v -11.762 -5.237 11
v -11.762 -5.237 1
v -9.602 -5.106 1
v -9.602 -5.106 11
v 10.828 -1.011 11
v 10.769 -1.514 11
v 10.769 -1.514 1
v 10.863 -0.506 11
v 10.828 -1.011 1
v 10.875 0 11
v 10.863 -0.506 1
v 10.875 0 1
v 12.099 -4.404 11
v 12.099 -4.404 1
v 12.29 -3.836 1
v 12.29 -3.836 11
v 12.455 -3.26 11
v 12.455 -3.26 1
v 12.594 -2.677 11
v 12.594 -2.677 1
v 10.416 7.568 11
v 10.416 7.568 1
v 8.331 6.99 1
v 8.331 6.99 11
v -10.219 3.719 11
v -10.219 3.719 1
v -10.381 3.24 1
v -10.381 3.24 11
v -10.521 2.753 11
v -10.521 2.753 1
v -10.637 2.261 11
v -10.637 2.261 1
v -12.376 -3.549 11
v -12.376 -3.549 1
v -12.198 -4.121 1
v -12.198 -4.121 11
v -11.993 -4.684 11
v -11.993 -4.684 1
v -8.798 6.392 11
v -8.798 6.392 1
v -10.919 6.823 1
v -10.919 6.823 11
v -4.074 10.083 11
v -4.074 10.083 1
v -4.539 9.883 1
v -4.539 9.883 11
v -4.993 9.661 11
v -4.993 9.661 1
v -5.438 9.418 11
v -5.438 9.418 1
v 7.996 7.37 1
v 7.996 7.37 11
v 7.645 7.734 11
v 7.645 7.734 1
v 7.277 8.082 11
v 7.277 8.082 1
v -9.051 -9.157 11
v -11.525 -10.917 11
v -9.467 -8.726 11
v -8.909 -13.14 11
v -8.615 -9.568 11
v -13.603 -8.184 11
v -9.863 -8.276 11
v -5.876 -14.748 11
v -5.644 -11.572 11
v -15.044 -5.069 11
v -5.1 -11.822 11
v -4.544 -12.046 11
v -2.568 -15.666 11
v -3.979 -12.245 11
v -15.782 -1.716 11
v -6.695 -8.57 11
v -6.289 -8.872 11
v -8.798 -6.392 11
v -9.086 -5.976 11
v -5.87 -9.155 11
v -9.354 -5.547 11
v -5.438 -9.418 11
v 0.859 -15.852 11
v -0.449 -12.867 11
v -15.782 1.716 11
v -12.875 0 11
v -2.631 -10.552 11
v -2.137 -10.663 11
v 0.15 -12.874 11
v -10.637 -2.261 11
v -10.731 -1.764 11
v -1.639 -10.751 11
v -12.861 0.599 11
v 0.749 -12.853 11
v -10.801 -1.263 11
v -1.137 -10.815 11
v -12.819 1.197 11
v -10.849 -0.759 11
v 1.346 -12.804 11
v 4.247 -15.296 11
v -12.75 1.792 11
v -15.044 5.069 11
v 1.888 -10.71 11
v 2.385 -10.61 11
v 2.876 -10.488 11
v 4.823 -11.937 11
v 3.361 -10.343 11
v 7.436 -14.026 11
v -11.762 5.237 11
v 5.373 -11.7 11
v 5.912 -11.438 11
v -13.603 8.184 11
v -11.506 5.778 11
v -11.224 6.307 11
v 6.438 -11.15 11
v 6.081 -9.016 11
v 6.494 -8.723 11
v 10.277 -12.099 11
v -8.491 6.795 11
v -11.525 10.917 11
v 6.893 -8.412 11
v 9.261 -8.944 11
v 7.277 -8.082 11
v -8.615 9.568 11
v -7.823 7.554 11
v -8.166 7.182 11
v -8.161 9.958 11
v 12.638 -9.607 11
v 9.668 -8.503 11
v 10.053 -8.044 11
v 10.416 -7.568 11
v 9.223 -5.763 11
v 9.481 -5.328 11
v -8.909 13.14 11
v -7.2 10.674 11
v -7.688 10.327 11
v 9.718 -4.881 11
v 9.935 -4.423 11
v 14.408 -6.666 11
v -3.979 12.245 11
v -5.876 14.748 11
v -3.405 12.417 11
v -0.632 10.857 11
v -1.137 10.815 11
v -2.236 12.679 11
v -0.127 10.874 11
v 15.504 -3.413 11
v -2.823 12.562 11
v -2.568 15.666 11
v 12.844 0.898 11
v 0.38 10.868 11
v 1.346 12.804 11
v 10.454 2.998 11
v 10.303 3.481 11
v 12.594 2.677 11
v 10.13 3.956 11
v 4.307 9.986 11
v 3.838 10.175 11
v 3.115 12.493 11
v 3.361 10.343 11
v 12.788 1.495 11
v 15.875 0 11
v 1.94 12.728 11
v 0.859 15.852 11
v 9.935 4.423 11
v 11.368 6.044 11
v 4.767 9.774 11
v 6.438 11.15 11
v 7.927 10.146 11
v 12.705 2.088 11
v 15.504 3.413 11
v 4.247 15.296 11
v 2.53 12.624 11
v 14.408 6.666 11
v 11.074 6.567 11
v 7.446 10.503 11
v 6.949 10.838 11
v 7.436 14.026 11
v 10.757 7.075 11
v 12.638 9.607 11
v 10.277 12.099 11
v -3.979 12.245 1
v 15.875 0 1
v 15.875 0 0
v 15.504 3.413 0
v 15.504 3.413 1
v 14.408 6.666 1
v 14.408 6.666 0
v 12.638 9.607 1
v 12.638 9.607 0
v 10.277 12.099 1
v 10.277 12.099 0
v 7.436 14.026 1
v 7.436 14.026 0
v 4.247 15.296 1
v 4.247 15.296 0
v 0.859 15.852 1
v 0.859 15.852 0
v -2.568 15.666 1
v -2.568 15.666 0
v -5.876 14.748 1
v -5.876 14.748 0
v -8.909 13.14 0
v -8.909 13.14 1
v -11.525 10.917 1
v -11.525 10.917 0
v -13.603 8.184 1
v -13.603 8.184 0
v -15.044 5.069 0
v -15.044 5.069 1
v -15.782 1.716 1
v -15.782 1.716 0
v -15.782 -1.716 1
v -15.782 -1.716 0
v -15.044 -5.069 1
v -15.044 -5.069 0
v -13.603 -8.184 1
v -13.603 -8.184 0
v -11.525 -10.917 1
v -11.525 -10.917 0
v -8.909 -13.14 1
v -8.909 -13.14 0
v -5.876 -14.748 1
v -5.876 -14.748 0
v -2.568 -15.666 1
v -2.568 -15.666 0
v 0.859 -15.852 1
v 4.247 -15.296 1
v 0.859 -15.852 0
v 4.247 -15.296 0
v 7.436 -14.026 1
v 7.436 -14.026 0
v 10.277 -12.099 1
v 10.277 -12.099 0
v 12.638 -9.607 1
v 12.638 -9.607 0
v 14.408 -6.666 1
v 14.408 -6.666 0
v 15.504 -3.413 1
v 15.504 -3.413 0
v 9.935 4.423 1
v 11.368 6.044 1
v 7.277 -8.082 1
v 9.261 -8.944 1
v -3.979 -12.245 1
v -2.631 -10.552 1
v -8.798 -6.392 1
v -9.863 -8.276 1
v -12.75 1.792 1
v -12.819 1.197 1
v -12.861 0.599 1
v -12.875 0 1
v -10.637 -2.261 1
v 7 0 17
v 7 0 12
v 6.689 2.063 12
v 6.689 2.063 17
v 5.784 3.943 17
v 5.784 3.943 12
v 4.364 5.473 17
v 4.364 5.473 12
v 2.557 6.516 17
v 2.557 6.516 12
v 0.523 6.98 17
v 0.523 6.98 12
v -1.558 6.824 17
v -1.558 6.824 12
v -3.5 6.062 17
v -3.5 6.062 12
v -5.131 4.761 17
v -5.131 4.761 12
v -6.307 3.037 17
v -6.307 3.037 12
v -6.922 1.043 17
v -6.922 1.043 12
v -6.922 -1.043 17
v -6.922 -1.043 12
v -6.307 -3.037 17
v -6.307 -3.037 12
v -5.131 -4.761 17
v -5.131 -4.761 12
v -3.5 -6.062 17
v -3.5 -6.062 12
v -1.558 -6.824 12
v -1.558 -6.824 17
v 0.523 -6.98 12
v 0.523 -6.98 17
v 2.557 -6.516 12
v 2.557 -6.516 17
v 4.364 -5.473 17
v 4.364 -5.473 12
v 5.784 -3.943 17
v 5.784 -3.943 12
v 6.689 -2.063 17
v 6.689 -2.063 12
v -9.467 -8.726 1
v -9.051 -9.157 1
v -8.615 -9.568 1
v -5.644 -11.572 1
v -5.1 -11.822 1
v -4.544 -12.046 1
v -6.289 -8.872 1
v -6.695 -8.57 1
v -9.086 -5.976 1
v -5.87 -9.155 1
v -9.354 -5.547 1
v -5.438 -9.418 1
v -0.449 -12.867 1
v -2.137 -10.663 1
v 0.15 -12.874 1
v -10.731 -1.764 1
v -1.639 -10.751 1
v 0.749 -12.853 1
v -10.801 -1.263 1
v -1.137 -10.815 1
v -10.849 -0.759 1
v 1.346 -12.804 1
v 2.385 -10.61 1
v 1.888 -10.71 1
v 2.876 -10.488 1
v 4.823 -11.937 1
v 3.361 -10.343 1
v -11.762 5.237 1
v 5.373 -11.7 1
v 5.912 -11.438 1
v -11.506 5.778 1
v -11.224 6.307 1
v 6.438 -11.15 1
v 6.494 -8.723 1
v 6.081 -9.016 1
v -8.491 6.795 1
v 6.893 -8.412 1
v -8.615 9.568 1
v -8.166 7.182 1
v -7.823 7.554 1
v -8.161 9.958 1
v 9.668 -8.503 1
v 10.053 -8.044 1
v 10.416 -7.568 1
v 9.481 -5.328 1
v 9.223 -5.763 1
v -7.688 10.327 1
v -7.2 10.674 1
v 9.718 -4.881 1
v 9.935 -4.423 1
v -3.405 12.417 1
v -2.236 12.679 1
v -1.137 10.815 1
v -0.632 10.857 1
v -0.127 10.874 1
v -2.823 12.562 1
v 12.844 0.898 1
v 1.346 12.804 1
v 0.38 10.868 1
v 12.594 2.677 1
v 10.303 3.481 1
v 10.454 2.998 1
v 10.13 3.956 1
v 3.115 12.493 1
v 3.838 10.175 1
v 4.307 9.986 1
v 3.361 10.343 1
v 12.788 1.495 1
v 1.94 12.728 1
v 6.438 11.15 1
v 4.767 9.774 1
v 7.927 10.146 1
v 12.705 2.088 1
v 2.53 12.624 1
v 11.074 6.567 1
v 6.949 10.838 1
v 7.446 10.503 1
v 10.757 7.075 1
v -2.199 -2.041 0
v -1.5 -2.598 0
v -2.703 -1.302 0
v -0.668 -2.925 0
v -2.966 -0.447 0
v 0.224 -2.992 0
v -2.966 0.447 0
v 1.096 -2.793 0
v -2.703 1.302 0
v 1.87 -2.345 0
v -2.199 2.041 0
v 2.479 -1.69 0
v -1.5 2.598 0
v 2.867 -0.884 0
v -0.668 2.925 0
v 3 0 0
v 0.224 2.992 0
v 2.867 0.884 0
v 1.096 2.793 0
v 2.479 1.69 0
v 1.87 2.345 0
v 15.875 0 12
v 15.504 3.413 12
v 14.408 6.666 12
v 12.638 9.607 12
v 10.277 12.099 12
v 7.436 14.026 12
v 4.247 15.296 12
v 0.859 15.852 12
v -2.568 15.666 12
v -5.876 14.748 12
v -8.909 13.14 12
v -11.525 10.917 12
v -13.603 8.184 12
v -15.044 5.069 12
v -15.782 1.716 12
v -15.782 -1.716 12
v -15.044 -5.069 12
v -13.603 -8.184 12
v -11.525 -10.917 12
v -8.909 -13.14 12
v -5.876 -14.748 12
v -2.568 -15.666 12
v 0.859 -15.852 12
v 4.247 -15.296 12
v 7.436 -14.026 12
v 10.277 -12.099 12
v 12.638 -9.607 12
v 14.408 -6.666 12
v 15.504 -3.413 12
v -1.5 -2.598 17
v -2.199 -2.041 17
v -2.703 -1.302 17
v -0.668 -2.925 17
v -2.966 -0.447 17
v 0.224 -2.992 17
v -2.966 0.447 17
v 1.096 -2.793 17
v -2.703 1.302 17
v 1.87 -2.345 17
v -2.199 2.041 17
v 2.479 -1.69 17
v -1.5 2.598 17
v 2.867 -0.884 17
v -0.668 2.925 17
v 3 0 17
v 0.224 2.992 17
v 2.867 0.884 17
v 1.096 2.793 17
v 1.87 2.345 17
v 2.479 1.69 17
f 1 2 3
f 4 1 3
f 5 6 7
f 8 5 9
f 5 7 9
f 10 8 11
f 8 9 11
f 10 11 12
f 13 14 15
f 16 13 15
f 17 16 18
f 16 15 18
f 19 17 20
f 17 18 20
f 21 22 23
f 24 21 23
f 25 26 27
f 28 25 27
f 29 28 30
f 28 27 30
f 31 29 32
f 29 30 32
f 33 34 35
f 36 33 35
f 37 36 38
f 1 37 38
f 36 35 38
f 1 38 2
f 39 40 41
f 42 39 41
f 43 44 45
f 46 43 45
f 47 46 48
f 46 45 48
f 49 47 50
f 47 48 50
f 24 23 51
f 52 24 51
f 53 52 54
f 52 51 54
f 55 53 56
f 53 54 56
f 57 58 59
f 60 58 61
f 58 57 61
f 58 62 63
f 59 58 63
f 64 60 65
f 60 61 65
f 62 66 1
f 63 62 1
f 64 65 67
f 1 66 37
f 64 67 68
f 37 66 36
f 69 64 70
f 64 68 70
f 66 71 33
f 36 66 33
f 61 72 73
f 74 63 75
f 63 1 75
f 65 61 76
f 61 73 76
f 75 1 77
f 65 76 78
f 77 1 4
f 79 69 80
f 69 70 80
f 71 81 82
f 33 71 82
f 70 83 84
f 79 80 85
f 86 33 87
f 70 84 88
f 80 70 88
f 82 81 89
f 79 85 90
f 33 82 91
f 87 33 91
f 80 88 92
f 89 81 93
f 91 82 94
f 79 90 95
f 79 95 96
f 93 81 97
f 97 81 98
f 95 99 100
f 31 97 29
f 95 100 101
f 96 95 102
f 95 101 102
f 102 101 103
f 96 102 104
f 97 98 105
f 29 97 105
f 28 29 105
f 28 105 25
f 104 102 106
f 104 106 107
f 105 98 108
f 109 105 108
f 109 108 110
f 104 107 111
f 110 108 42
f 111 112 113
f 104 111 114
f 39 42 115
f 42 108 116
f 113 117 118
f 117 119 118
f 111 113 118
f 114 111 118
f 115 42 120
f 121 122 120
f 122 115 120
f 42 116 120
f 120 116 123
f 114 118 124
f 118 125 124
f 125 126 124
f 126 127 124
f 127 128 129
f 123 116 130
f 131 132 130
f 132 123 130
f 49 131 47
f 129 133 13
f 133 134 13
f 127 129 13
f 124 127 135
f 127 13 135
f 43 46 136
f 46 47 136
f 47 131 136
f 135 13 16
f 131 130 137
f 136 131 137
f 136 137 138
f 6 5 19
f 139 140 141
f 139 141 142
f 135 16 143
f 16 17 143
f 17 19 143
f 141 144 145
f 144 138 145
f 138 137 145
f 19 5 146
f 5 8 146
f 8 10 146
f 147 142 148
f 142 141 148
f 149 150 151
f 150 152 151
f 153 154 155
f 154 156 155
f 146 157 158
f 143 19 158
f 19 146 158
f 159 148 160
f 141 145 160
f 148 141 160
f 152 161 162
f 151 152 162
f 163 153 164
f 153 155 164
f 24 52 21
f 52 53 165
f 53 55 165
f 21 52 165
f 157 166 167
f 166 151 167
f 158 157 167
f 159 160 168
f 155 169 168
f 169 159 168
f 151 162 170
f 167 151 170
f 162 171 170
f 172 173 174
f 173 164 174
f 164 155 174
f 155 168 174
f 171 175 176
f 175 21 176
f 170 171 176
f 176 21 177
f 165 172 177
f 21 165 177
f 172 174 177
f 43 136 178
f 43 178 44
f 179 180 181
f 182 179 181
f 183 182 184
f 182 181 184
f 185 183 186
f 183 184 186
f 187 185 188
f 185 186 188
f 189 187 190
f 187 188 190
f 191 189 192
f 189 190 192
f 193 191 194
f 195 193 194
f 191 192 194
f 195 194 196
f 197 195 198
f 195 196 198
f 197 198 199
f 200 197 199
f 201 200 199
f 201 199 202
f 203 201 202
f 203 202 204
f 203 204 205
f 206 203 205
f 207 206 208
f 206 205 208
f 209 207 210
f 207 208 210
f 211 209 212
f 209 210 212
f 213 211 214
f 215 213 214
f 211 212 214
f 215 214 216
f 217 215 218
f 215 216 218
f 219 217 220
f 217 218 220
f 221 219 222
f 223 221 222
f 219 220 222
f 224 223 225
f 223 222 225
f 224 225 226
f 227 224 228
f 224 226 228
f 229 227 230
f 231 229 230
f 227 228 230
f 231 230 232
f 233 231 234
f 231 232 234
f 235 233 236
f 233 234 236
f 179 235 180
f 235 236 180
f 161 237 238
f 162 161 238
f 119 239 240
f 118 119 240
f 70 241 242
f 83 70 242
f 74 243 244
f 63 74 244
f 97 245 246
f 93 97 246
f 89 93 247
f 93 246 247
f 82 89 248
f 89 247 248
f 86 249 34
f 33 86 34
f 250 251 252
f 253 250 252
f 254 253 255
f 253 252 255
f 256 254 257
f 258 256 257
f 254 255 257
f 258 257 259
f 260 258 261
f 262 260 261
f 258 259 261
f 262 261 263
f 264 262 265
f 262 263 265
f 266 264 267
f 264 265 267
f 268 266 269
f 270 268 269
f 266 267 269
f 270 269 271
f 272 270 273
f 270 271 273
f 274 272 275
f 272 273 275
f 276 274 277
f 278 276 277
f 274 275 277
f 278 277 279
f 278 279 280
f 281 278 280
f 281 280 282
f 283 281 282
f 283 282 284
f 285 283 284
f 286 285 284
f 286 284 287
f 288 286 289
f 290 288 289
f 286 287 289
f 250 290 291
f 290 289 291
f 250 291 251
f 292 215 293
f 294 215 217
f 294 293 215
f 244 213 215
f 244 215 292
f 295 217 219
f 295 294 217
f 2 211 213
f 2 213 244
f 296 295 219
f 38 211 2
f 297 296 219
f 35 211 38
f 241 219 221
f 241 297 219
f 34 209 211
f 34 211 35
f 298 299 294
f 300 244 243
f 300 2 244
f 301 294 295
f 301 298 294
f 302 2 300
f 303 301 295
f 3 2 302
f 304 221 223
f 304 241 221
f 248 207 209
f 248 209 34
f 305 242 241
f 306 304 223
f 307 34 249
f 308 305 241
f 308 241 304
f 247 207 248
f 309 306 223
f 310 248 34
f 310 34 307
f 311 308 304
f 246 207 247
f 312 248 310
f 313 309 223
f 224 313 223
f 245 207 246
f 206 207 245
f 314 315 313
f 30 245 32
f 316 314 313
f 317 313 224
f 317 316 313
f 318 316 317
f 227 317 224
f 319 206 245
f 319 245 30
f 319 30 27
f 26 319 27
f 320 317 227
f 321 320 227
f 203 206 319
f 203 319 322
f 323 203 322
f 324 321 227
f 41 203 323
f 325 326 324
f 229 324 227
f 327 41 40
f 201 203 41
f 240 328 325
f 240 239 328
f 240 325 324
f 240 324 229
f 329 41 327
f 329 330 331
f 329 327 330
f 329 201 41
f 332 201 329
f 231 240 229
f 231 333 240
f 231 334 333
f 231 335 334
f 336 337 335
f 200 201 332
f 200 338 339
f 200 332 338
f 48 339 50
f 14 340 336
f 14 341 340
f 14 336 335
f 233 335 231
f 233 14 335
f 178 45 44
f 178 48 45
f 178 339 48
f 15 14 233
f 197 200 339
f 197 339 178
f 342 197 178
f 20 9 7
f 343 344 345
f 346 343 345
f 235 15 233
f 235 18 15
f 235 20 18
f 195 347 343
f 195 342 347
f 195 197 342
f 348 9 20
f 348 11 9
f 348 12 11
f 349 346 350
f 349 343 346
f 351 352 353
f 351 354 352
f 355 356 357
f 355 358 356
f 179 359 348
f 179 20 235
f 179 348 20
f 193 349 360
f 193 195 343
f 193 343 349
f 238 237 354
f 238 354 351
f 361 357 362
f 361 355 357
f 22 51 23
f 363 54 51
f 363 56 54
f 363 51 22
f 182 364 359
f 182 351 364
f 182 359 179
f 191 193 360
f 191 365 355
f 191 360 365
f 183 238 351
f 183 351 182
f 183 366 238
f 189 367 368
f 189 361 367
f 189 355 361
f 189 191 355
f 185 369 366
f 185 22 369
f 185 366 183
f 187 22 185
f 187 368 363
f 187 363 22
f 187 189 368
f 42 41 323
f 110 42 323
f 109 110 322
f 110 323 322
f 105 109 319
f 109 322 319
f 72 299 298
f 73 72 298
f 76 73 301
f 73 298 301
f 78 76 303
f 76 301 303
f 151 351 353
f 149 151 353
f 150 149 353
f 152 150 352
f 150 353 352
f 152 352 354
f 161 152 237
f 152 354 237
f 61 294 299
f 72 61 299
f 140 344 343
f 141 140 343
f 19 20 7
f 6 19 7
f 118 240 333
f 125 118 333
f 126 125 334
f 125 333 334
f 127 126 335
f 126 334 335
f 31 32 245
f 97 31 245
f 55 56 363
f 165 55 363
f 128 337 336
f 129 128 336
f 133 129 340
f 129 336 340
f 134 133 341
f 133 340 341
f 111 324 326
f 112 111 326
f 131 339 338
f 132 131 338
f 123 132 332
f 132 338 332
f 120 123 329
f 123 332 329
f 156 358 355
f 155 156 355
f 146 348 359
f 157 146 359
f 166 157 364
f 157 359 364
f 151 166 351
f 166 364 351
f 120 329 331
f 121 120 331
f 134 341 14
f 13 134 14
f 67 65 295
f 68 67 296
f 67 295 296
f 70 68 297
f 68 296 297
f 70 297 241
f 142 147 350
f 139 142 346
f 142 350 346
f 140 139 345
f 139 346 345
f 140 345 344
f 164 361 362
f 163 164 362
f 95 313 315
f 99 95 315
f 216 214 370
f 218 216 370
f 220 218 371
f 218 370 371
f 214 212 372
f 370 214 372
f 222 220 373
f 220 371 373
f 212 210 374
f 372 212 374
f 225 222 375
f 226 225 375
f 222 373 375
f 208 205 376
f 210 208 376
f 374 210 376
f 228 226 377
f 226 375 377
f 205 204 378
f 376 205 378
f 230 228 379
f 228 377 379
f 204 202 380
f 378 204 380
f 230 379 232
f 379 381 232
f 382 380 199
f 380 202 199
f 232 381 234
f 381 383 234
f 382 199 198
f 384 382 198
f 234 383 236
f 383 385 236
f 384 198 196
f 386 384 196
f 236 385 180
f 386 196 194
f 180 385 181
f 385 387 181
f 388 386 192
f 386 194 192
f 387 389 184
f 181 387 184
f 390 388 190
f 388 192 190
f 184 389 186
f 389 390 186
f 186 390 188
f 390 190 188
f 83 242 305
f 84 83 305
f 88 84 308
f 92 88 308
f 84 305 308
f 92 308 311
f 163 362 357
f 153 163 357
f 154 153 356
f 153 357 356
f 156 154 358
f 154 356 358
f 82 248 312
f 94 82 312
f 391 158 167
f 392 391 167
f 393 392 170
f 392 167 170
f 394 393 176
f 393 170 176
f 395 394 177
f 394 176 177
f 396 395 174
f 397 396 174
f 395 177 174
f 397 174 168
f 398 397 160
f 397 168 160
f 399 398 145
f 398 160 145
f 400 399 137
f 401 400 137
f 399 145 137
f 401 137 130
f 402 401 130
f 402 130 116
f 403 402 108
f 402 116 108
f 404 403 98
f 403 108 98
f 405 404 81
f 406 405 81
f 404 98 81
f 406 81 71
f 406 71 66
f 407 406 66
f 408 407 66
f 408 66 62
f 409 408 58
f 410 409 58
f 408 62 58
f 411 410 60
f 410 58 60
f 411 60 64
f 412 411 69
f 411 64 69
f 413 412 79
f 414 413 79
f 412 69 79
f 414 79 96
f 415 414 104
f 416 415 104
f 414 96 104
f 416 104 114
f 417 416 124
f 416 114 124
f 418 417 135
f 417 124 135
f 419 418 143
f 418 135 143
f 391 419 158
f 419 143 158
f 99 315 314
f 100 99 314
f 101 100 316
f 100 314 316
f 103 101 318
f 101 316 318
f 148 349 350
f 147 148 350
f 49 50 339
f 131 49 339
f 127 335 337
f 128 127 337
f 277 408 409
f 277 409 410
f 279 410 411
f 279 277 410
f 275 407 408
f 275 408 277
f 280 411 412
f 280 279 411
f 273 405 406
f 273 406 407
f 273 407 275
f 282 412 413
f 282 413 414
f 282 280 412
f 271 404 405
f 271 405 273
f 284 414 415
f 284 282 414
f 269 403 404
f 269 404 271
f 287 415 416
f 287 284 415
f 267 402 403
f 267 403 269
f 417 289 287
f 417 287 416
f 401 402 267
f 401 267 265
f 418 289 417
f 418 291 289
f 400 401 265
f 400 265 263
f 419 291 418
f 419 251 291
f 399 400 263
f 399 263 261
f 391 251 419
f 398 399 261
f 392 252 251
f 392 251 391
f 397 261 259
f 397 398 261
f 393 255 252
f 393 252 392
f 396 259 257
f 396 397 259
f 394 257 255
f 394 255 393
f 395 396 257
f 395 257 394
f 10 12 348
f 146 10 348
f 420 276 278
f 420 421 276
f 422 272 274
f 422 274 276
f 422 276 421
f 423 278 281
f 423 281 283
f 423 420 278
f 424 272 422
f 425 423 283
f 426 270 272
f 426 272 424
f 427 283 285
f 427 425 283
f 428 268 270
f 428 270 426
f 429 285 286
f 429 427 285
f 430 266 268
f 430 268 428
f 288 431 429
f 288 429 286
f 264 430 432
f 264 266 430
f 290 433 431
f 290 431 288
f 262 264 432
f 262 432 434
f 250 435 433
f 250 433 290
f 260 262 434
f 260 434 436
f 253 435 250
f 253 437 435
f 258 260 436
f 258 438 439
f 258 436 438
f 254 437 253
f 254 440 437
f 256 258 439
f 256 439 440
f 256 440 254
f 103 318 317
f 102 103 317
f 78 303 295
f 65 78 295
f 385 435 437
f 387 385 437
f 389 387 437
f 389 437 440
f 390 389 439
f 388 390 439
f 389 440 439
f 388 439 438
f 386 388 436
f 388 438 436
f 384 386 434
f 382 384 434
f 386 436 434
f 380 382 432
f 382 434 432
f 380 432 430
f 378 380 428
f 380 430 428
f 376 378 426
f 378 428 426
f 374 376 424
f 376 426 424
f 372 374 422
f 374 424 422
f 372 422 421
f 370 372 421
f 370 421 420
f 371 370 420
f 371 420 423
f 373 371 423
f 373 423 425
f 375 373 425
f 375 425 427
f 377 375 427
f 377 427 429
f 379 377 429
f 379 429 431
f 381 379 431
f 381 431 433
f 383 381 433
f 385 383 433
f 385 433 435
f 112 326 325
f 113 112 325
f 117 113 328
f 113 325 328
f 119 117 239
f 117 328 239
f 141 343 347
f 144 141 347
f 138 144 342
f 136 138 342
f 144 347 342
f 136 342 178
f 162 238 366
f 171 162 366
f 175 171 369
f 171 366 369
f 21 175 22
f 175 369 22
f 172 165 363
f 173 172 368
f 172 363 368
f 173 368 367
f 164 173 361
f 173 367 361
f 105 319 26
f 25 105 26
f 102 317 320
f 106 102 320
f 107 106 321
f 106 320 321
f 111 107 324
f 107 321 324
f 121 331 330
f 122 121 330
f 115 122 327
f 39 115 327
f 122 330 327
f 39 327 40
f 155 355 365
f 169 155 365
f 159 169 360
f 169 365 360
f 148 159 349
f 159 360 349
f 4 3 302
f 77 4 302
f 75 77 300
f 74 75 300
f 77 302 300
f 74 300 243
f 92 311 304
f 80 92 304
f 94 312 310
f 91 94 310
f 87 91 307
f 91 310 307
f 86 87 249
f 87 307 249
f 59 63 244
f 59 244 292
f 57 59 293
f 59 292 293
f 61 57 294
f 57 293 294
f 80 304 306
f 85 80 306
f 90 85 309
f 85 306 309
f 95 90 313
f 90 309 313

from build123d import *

# Parameters (mm, degrees)
SKETCH1_R           = 15.875
BOSS_EXTRUDE1_DEPTH = 1
BOSS_EXTRUDE2_DEPTH = 10
SKETCH3_R           = 15.875
BOSS_EXTRUDE3_DEPTH = 1
SKETCH4_R           = 7
BOSS_EXTRUDE4_DEPTH = 5
CUT_EXTRUDE1_REACH  = 30.161
SKETCH5_R           = 3


with BuildPart() as part:
    # Sketch1 → Boss-Extrude1 (new body)
    with BuildSketch(Plane.XY):
        Circle(SKETCH1_R)
    extrude(amount=BOSS_EXTRUDE1_DEPTH)

    # Sketch2 → Boss-Extrude2 (add)
    with BuildSketch(Plane.XY.offset(1)):
        with BuildLine():
            Line((9.934806852, -4.423260993), (12.098542493, -4.403509345))
            ThreePointArc((12.098542493, -4.403509345), (12.376244335, -3.548830956), (12.593650359, -2.676863019))
            Line((12.593650359, -2.676863019), (10.769165248, -1.513507473))
            ThreePointArc((10.769165248, -1.513507473), (10.848509047, -0.758601652), (10.875, 0))
            Line((10.875, 0), (12.843637147, 0.898114599))
            ThreePointArc((12.843637147, 0.898114599), (12.749701385, 1.791853675), (12.593650359, 2.676863019))
            Line((12.593650359, 2.676863019), (10.453720943, 2.997556245))
            ThreePointArc((10.453720943, 2.997556245), (10.219157251, 3.719469059), (9.934806852, 4.423260993))
            Line((9.934806852, 4.423260993), (11.367950258, 6.044446371))
            ThreePointArc((11.367950258, 6.044446371), (10.918619238, 6.822710527), (10.416093803, 7.567735123))
            Line((10.416093803, 7.567735123), (8.330733319, 6.990315255))
            ThreePointArc((8.330733319, 6.990315255), (7.822820329, 7.554409779), (7.276795344, 8.081699977))
            Line((7.276795344, 8.081699977), (7.926641495, 10.145638453))
            ThreePointArc((7.926641495, 10.145638453), (7.199608632, 10.673858747), (6.4375, 11.150077074))
            Line((6.4375, 11.150077074), (4.767286221, 9.774385254))
            ThreePointArc((4.767286221, 9.774385254), (4.073846703, 10.083124418), (3.360559814, 10.342739615))
            Line((3.360559814, 10.342739615), (3.114744406, 12.492557476))
            ThreePointArc((3.114744406, 12.492557476), (2.235720287, 12.67939982), (1.345803965, 12.804469403))
            Line((1.345803965, 12.804469403), (0.379532027, 10.868375244))
            ThreePointArc((0.379532027, 10.868375244), (-0.379532027, 10.868375244), (-1.136747038, 10.815425612))
            Line((-1.136747038, 10.815425612), (-2.235720287, 12.67939982))
            ThreePointArc((-2.235720287, 12.67939982), (-3.114744406, 12.492557476), (-3.978593803, 12.244852647))
            Line((-3.978593803, 12.244852647), (-4.073846703, 10.083124418))
            ThreePointArc((-4.073846703, 10.083124418), (-4.767286221, 9.774385254), (-5.4375, 9.418026266))
            Line((-5.4375, 9.418026266), (-7.199608632, 10.673858747))
            ThreePointArc((-7.199608632, 10.673858747), (-7.926641495, 10.145638453), (-8.615056557, 9.567989628))
            Line((-8.615056557, 9.567989628), (-7.822820329, 7.554409779))
            ThreePointArc((-7.822820329, 7.554409779), (-8.330733319, 6.990315255), (-8.798059814, 6.392164619))
            Line((-8.798059814, 6.392164619), (-10.918619238, 6.822710527))
            ThreePointArc((-10.918619238, 6.822710527), (-11.367950258, 6.044446371), (-11.761897767, 5.23673428))
            Line((-11.761897767, 5.23673428), (-10.219157251, 3.719469059))
            ThreePointArc((-10.219157251, 3.719469059), (-10.453720943, 2.997556245), (-10.637355158, 2.261039638))
            Line((-10.637355158, 2.261039638), (-12.749701385, 1.791853675))
            ThreePointArc((-12.749701385, 1.791853675), (-12.843637147, 0.898114599), (-12.875, 0))
            Line((-12.875, 0), (-10.848509047, -0.758601652))
            ThreePointArc((-10.848509047, -0.758601652), (-10.769165248, -1.513507473), (-10.637355158, -2.261039638))
            Line((-10.637355158, -2.261039638), (-12.376244335, -3.548830956))
            ThreePointArc((-12.376244335, -3.548830956), (-12.098542493, -4.403509345), (-11.761897767, -5.23673428))
            Line((-11.761897767, -5.23673428), (-9.602055072, -5.105503245))
            ThreePointArc((-9.602055072, -5.105503245), (-9.222523046, -5.762871999), (-8.798059814, -6.392164619))
            Line((-8.798059814, -6.392164619), (-9.862822205, -8.275890475))
            ThreePointArc((-9.862822205, -8.275890475), (-9.261499929, -8.94372652), (-8.615056557, -9.567989628))
            Line((-8.615056557, -9.567989628), (-6.695318544, -8.569616945))
            ThreePointArc((-6.695318544, -8.569616945), (-6.081222825, -9.015783602), (-5.4375, -9.418026266))
            Line((-5.4375, -9.418026266), (-5.644028515, -11.571973346))
            ThreePointArc((-5.644028515, -11.571973346), (-4.82305989, -11.937492128), (-3.978593803, -12.244852647))
            Line((-3.978593803, -12.244852647), (-2.630900615, -10.551966023))
            ThreePointArc((-2.630900615, -10.551966023), (-1.888423932, -10.709784314), (-1.136747038, -10.815425612))
            Line((-1.136747038, -10.815425612), (-0.44933102, -12.867156898))
            ThreePointArc((-0.44933102, -12.867156898), (0.44933102, -12.867156898), (1.345803965, -12.804469403))
            Line((1.345803965, -12.804469403), (1.888423932, -10.709784314))
            ThreePointArc((1.888423932, -10.709784314), (2.630900615, -10.551966023), (3.360559814, -10.342739615))
            Line((3.360559814, -10.342739615), (4.82305989, -11.937492128))
            ThreePointArc((4.82305989, -11.937492128), (5.644028515, -11.571973346), (6.4375, -11.150077074))
            Line((6.4375, -11.150077074), (6.081222825, -9.015783602))
            ThreePointArc((6.081222825, -9.015783602), (6.695318544, -8.569616945), (7.276795344, -8.081699977))
            Line((7.276795344, -8.081699977), (9.261499929, -8.94372652))
            ThreePointArc((9.261499929, -8.94372652), (9.862822205, -8.275890475), (10.416093803, -7.567735123))
            Line((10.416093803, -7.567735123), (9.222523046, -5.762871999))
            ThreePointArc((9.222523046, -5.762871999), (9.602055072, -5.105503245), (9.934806852, -4.423260993))
        make_face()
    extrude(amount=BOSS_EXTRUDE2_DEPTH)

    # Sketch3 → Boss-Extrude3 (add)
    with BuildSketch(Plane.XY.offset(11)):
        Circle(SKETCH3_R)
    extrude(amount=BOSS_EXTRUDE3_DEPTH)

    # Sketch4 → Boss-Extrude4 (add)
    with BuildSketch(Plane.XY.offset(12)):
        Circle(SKETCH4_R)
    extrude(amount=BOSS_EXTRUDE4_DEPTH)

    # Sketch5 → Cut-Extrude1 (cut, up to next)
    with BuildSketch(Plane.XY.offset(17), mode=Mode.PRIVATE) as cut_extrude1_sk1:
        Circle(SKETCH5_R)
    cut_extrude1_tool1 = extrude(cut_extrude1_sk1.sketch, amount=-CUT_EXTRUDE1_REACH, mode=Mode.PRIVATE) & part.part
    add(cut_extrude1_tool1.solids().sort_by_distance((0, 0, 17))[0], mode=Mode.SUBTRACT)


solid = part.part
